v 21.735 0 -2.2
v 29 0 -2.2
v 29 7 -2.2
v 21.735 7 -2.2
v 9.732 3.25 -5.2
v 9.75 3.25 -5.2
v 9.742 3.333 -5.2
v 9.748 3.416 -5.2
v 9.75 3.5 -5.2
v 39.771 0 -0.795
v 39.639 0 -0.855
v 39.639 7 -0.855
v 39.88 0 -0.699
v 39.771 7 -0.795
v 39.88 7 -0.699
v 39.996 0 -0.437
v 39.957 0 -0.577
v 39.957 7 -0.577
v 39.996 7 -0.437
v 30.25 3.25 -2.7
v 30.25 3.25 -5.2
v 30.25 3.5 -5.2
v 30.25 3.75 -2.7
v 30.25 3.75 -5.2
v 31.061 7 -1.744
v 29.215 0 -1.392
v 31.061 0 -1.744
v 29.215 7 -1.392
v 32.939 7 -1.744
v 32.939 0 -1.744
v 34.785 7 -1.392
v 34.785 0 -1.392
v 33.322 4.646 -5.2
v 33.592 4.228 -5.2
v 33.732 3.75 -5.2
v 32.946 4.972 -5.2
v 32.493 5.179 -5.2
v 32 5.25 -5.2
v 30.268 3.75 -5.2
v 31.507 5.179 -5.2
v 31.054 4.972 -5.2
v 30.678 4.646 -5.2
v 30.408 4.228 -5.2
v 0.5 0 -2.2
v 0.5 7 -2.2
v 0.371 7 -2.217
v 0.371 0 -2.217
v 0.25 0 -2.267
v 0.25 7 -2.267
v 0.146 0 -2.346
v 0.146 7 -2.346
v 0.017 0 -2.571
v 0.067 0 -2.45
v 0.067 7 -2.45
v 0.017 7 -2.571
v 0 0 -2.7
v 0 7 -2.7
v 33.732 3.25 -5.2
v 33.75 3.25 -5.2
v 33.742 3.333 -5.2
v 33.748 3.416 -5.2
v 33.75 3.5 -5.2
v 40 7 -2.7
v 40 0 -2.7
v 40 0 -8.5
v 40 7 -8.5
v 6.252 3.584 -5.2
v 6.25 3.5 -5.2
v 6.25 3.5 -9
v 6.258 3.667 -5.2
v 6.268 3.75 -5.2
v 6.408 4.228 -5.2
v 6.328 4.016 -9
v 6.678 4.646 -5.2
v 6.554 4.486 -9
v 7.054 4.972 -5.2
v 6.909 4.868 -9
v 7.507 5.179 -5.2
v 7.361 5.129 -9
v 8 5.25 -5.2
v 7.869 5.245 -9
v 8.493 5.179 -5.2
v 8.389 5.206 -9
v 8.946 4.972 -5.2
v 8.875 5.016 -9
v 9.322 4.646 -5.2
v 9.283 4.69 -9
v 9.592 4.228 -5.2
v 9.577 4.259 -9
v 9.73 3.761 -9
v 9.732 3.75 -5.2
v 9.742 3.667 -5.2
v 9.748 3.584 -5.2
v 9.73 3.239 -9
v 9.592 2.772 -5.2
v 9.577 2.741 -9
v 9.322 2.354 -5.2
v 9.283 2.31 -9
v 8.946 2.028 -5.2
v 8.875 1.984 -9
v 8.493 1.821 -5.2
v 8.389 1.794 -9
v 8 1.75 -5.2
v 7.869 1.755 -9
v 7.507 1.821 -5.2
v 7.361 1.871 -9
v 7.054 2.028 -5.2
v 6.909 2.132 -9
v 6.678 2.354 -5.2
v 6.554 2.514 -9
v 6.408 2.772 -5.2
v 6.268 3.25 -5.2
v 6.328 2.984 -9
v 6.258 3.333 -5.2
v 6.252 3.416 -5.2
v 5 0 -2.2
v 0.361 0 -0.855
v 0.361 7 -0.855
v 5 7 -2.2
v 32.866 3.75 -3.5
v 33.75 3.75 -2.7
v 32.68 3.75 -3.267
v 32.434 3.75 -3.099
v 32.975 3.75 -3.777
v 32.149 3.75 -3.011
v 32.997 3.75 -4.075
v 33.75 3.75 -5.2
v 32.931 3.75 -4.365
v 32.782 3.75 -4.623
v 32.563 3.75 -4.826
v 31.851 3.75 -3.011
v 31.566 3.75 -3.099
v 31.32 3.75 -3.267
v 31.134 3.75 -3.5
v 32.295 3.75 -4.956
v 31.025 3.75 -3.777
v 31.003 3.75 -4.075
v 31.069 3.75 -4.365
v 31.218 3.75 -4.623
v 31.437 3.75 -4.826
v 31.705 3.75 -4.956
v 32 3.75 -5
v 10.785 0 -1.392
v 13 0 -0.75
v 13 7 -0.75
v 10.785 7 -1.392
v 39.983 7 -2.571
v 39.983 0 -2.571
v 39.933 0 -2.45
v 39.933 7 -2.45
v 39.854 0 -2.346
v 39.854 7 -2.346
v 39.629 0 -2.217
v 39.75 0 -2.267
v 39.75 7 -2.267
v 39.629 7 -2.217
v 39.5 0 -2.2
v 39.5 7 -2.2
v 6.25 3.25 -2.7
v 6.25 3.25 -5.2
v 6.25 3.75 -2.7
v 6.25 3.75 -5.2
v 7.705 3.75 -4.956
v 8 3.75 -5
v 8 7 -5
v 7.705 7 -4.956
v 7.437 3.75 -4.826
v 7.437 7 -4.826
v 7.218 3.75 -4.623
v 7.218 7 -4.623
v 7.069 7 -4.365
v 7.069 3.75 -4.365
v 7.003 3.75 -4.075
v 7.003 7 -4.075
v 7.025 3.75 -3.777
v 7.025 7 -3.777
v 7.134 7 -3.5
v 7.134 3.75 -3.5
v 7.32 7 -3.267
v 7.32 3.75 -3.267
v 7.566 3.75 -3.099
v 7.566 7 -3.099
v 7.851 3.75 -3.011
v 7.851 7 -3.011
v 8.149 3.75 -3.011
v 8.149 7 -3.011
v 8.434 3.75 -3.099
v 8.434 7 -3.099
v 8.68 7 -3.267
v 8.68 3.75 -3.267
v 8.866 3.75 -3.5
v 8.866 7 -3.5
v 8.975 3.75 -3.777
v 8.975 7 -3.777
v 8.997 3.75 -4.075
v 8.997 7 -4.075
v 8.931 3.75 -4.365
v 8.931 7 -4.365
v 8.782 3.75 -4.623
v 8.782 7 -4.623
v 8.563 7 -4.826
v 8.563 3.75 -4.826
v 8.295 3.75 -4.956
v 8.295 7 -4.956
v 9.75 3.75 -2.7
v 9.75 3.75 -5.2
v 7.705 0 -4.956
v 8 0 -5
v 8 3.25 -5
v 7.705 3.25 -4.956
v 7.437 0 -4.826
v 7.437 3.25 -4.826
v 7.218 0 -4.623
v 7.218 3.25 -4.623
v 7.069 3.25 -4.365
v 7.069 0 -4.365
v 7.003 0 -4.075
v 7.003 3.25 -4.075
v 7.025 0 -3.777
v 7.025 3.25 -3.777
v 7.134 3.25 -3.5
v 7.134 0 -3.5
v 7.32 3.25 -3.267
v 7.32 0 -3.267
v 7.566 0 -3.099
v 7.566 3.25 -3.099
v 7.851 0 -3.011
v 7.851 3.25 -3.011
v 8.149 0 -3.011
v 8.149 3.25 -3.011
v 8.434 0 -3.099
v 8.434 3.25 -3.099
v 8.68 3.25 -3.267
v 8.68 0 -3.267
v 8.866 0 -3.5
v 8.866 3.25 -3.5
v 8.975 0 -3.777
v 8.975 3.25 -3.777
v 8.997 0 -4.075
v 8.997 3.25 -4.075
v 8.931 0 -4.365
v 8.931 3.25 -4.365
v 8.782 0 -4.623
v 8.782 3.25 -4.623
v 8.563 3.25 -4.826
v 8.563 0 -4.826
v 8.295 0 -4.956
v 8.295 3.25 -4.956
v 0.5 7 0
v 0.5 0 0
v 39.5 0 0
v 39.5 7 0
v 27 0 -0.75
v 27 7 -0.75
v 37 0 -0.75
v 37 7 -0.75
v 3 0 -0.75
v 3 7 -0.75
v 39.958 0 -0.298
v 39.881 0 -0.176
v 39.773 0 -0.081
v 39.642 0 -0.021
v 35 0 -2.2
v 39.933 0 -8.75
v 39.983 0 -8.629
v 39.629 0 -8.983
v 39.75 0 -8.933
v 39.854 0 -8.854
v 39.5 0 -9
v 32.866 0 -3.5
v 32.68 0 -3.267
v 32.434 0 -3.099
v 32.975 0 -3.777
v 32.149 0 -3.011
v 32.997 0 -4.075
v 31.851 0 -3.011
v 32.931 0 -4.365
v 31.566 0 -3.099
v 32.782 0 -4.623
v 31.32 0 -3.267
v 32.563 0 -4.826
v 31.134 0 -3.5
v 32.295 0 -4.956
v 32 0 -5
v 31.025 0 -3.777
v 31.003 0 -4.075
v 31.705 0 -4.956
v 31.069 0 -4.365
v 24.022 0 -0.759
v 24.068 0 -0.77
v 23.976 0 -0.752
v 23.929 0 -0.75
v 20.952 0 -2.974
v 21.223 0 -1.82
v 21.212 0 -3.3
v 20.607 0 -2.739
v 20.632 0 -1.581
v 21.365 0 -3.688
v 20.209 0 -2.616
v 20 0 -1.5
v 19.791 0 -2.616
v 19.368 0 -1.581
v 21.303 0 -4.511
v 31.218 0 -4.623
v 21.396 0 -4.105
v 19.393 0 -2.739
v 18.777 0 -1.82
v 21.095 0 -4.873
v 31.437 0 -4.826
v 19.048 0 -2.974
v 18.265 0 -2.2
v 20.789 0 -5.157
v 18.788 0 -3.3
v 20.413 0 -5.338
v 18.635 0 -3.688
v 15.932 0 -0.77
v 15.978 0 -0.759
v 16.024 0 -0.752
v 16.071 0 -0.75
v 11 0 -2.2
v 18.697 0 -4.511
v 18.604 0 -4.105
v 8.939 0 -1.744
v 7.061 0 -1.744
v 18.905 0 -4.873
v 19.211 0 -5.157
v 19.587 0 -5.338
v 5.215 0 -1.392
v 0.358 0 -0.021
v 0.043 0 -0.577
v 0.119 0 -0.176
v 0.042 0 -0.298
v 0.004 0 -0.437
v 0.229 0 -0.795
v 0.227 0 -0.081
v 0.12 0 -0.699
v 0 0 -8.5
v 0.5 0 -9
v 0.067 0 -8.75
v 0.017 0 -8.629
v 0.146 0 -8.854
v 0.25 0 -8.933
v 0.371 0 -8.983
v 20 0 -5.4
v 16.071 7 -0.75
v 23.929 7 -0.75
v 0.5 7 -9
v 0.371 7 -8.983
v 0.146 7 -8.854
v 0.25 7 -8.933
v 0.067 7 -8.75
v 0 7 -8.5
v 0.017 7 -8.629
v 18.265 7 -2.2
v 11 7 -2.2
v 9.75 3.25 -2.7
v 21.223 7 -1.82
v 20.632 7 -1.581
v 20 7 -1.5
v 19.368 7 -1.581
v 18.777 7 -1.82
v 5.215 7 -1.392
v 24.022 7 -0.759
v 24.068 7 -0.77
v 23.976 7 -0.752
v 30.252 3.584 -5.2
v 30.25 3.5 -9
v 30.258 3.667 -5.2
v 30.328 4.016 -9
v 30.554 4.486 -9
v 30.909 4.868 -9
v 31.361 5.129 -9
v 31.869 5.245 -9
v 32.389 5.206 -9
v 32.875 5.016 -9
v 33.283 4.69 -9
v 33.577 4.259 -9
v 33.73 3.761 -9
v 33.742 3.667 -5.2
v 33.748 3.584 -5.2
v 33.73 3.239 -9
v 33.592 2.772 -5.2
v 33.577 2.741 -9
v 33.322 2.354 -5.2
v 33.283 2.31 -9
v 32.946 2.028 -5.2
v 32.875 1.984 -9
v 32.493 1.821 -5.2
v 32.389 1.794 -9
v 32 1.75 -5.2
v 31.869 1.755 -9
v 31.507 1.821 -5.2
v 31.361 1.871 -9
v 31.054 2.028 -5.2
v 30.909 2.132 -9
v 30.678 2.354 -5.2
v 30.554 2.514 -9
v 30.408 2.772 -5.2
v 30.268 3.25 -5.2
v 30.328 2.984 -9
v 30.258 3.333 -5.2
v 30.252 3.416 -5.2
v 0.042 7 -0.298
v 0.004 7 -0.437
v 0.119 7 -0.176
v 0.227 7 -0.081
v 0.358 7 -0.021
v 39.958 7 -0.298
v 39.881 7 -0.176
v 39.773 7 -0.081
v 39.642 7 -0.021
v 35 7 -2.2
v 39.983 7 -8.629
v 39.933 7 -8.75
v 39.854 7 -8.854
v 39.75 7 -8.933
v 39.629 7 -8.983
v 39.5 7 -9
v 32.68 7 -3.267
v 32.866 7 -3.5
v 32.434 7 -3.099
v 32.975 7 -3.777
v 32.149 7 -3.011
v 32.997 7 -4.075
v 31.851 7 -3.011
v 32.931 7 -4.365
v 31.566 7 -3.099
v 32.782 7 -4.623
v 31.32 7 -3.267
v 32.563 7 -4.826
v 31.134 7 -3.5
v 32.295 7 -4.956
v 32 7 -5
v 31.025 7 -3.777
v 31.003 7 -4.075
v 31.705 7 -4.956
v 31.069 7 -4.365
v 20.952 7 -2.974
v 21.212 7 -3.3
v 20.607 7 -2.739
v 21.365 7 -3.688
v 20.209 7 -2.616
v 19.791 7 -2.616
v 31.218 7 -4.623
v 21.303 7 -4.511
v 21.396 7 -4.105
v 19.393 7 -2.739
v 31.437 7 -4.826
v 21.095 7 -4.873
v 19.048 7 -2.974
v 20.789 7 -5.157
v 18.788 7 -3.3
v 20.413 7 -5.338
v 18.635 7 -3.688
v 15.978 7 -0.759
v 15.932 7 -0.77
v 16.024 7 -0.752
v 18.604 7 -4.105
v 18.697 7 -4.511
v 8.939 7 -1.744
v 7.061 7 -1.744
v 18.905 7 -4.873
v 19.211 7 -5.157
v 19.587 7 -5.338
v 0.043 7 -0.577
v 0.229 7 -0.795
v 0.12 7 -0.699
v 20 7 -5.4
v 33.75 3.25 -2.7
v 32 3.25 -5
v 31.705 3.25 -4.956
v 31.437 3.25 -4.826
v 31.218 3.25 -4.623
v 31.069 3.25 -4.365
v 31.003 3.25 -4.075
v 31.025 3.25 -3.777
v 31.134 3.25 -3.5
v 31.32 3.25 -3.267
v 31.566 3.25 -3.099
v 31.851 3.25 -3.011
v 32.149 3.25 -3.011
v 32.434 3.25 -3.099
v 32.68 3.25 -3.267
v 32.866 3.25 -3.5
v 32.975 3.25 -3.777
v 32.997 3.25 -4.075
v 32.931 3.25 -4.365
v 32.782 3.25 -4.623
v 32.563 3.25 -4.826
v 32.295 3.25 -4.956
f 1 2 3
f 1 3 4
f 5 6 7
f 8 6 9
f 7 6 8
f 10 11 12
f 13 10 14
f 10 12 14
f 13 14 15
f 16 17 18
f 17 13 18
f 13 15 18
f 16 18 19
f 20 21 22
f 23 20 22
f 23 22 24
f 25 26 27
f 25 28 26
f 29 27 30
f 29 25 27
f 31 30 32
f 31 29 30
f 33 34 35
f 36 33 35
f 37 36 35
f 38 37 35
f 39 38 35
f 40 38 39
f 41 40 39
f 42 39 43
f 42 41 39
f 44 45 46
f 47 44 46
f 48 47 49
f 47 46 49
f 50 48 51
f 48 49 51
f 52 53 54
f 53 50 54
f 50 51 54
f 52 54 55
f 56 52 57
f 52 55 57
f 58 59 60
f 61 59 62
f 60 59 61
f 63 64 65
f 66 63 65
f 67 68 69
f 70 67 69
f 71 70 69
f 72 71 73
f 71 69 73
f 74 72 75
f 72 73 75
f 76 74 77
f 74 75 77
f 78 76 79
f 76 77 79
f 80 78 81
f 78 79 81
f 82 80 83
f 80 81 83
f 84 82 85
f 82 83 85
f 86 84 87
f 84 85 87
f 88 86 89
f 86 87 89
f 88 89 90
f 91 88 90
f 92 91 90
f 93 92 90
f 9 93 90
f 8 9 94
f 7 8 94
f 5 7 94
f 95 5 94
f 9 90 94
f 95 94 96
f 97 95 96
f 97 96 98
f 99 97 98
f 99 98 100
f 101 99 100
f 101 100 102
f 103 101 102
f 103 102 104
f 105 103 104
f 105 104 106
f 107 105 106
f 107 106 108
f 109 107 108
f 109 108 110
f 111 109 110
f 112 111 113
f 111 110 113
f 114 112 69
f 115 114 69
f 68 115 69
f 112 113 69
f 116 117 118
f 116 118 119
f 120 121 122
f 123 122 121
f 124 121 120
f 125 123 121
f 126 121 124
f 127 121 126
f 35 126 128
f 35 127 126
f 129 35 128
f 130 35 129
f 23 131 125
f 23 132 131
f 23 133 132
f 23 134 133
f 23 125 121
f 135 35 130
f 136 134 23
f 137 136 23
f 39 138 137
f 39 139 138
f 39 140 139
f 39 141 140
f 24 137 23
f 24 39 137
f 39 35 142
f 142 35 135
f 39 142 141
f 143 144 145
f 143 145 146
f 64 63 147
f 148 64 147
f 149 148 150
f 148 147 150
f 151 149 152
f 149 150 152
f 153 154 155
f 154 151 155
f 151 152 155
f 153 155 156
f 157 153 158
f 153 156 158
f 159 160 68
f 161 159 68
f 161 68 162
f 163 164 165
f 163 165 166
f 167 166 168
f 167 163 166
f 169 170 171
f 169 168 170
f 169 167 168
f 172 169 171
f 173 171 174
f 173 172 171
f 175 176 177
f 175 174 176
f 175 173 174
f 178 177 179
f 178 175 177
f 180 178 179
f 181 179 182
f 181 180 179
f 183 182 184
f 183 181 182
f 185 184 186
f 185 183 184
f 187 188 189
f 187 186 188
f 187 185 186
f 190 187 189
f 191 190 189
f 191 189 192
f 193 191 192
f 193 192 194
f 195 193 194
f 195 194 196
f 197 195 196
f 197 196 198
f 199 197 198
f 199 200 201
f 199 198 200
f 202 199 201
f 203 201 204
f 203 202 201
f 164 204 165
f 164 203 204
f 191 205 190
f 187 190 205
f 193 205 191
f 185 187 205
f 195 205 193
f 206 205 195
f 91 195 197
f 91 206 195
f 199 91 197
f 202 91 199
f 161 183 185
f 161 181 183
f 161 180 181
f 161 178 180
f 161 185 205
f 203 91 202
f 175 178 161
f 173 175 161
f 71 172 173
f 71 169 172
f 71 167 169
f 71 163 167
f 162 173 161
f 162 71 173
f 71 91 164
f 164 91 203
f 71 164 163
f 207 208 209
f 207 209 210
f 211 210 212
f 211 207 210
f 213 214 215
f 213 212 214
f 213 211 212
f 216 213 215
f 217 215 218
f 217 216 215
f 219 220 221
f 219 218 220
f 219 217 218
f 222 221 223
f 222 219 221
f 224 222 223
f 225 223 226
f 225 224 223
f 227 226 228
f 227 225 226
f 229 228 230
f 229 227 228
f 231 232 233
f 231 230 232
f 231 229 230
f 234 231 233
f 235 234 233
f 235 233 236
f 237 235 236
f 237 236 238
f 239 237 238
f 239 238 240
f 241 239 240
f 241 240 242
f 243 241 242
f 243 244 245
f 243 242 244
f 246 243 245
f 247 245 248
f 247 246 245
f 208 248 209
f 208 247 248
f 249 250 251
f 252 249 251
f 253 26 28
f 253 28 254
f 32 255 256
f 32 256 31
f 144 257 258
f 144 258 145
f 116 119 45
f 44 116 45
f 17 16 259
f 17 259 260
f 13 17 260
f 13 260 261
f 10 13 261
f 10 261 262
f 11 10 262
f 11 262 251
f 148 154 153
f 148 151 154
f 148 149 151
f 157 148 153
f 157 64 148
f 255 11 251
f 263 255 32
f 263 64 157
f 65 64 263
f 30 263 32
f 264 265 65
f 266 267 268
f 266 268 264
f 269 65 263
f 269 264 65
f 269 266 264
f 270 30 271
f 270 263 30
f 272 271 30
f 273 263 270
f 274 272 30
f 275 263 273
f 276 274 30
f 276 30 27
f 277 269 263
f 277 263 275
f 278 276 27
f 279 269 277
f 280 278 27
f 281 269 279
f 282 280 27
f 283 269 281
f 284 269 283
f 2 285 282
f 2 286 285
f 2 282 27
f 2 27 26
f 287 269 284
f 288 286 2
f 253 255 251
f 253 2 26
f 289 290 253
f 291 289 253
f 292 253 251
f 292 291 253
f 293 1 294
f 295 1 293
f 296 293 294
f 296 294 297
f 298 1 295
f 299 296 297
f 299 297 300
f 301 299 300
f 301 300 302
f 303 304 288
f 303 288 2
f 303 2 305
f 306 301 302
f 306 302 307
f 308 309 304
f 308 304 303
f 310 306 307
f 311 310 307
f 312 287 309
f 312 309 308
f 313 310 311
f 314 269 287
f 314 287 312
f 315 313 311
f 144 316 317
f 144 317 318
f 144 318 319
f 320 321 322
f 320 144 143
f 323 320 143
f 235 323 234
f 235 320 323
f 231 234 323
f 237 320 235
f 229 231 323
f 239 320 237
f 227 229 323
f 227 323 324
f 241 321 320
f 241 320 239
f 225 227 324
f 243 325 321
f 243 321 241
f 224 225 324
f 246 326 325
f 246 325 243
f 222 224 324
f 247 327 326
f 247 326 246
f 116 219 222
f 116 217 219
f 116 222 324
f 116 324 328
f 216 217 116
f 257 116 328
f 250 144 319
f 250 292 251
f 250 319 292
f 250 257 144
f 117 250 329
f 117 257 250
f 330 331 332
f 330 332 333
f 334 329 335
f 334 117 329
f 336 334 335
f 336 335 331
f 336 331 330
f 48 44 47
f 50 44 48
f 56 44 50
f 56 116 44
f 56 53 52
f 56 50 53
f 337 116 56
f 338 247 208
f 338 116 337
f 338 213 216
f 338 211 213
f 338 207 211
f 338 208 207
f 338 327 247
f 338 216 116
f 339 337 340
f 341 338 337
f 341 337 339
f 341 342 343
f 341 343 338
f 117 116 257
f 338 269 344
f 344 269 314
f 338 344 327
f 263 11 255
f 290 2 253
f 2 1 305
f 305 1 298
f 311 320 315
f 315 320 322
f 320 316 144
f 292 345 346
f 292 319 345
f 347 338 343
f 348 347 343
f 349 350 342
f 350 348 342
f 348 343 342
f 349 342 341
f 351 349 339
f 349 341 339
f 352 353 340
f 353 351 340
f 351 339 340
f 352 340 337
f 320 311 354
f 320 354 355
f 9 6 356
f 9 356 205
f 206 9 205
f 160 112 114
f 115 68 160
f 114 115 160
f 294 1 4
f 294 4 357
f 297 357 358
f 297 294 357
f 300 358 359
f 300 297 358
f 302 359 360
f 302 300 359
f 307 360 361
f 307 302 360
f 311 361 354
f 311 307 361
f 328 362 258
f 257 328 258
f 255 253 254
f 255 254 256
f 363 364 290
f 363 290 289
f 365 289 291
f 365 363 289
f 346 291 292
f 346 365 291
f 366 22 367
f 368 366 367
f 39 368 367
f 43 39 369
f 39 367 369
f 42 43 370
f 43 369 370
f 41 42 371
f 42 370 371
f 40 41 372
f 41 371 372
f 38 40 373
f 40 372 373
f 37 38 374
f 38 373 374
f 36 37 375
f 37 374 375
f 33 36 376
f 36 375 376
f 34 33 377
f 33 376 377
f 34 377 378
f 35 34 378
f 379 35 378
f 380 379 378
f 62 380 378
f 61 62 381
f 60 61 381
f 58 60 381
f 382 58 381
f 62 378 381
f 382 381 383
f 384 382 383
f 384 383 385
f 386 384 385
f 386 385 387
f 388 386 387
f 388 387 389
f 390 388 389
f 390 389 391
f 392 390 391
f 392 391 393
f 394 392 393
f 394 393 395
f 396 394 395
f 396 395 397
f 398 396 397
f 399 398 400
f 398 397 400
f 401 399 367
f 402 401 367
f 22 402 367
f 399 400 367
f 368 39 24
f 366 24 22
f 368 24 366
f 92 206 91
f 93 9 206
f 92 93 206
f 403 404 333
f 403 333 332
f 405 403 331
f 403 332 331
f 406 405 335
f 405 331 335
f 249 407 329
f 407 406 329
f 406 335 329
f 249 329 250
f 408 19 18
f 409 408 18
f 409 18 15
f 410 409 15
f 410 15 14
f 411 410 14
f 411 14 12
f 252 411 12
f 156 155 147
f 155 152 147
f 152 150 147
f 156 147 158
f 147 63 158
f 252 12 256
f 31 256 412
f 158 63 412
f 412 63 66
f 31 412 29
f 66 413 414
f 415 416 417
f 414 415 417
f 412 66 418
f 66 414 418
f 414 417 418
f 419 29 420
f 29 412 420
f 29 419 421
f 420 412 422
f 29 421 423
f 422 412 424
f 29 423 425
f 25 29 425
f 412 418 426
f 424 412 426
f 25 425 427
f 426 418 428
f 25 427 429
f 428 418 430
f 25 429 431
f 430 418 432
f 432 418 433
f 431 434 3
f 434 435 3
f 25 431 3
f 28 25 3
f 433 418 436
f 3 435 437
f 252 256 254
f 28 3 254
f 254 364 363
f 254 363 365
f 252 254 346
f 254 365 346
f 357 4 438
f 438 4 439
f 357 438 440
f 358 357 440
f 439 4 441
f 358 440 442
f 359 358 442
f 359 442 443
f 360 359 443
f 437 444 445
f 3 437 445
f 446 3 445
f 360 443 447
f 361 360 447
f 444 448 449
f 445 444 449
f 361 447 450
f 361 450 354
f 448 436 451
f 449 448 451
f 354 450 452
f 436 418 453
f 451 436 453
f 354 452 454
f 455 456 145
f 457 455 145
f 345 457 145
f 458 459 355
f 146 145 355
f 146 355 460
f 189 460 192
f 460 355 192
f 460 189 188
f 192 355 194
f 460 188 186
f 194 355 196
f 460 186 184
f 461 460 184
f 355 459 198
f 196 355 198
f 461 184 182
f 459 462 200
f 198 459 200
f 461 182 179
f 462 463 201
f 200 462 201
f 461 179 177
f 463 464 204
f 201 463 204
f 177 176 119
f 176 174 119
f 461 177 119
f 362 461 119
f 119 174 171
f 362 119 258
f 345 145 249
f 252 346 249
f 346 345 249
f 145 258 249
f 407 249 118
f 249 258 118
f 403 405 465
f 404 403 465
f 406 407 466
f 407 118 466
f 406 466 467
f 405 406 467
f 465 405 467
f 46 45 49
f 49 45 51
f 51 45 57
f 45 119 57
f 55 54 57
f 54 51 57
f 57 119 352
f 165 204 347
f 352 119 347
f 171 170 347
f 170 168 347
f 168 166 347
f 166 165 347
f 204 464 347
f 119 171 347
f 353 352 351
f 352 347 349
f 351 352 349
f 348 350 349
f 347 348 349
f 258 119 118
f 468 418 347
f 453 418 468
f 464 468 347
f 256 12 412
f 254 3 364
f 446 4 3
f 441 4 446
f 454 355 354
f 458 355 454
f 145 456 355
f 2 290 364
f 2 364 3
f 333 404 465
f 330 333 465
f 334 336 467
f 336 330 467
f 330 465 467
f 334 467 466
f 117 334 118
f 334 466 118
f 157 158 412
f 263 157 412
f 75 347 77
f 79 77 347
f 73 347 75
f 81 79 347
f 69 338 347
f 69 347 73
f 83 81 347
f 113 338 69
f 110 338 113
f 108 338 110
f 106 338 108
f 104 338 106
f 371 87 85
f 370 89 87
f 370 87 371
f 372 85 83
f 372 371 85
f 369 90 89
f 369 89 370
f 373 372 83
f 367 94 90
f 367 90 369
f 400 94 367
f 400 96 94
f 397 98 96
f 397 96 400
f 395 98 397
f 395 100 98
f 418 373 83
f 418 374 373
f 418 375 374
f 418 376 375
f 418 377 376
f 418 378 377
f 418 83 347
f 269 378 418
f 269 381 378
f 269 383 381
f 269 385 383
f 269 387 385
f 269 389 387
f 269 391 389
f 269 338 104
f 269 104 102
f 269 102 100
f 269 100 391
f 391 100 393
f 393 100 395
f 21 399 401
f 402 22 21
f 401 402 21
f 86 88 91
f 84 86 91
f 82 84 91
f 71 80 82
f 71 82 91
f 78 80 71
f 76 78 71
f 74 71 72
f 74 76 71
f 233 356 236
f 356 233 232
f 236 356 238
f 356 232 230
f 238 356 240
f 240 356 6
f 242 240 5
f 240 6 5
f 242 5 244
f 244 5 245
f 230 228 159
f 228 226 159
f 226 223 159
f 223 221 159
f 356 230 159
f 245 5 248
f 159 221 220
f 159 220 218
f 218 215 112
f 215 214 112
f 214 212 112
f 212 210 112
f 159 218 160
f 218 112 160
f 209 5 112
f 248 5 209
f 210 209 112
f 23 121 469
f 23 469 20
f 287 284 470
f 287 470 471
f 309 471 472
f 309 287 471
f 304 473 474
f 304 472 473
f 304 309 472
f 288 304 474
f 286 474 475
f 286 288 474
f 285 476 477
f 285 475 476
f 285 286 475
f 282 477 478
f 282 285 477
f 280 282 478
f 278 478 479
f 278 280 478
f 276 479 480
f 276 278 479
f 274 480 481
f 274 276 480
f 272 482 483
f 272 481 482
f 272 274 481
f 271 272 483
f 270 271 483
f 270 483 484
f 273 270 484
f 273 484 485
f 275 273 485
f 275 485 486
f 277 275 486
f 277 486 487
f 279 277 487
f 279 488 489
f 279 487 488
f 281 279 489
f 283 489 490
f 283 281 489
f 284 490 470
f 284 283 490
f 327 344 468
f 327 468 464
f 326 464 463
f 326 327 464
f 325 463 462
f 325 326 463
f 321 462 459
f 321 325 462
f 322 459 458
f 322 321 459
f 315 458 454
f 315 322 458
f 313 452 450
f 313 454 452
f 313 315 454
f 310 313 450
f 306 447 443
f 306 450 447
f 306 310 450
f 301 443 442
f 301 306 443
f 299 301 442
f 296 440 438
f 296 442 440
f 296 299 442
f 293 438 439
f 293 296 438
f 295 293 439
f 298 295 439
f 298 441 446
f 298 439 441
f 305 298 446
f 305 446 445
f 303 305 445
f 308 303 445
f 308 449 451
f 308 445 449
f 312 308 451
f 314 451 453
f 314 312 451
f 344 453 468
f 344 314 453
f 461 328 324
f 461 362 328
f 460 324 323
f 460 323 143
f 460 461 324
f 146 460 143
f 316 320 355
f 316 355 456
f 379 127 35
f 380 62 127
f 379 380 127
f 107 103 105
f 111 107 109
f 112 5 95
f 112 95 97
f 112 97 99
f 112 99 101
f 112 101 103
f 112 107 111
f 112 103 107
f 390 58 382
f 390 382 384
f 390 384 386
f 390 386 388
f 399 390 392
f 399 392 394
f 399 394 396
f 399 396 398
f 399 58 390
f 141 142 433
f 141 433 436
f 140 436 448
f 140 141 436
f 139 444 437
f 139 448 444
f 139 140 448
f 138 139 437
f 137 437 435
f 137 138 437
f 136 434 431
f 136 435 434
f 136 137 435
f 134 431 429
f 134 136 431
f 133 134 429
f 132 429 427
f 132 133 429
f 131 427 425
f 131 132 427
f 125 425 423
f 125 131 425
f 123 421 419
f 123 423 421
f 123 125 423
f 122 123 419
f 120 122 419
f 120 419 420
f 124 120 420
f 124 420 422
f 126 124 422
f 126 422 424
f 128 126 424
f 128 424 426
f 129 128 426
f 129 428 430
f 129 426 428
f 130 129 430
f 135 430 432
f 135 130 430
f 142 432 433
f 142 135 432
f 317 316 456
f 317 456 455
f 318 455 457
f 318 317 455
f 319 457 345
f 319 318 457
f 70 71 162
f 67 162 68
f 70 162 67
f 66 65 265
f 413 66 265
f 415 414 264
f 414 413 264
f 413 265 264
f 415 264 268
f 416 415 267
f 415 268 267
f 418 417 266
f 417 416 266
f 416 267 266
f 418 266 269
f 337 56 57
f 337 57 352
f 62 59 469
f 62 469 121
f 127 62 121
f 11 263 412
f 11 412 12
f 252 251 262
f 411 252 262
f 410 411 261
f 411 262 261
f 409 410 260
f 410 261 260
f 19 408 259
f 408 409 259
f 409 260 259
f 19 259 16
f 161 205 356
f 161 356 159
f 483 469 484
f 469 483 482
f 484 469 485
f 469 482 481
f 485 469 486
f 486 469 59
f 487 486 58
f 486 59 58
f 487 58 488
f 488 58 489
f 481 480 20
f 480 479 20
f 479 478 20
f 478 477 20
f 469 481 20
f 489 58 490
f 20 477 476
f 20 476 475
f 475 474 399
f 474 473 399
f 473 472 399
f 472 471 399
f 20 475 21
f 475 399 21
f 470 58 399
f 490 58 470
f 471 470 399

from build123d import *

# Parameters (mm, degrees)
SKETCH1_W               = 40
SKETCH1_H               = 9
BOSS_EXTRUDE1_DEPTH     = 7
CUT_EXTRUDE1_DEPTH      = 5
CUT_EXTRUDE1_DEPTH_BACK = 10
SKETCH2_R               = 1
SKETCH2_R_2             = 1.4
FILLET1_R               = 10
FILLET2_R               = 0.5
SKETCH3_R               = 1.75
CUT_EXTRUDE6_DEPTH      = 3.8
SKETCH4_W               = 3.5
SKETCH4_H               = 0.5
CUT_EXTRUDE7_DEPTH      = 2.5


with BuildPart() as part:
    # Sketch1 → Boss-Extrude1 (new body)
    with BuildSketch(Plane(origin=(0, 0, 0), x_dir=(1, 0, 0), z_dir=(0, 1, 0))):
        with Locations((20, 4.5)):
            Rectangle(SKETCH1_W, SKETCH1_H)
    extrude(amount=BOSS_EXTRUDE1_DEPTH)

    # Sketch2 → Cut-Extrude1 (cut, two sides: drawn at the far end of the back side and taken through both)
    with BuildSketch(Plane(origin=(0, 7, 0), x_dir=(1, 0, 0), z_dir=(0, 1, 0)).offset(-CUT_EXTRUDE1_DEPTH_BACK)):
        with Locations(Location((8, 4, 0), (0, 0, 90))):
            Circle(SKETCH2_R)
        with Locations(Location((32, 4, 0), (0, 0, 90))):
            Circle(SKETCH2_R)
        with Locations(Location((20, 4, 0), (0, 0, 90))):
            Circle(SKETCH2_R_2)
        with BuildLine():
            ThreePointArc((21.734935157, 2.2), (20, 1.5), (18.265064843, 2.2))
            Line((18.265064843, 2.2), (11, 2.2))
            Line((11, 2.2), (16, 0.75))
            Line((16, 0.75), (24, 0.75))
            Line((24, 0.75), (29, 2.2))
            Line((29, 2.2), (21.734935157, 2.2))
        make_face()
        Polygon((13, 0.75), (8, 2.2), (3, 0.75), align=None)
        Polygon((37, 0.75), (32, 2.2), (27, 0.75), align=None)
        Polygon((0, 0.75), (5, 2.2), (0, 2.2), align=None)
        Polygon((40, 2.2), (35, 2.2), (40, 0.75), align=None)
    extrude(amount=CUT_EXTRUDE1_DEPTH + CUT_EXTRUDE1_DEPTH_BACK, mode=Mode.SUBTRACT)

    # Fillet1
    fillet1_edges = [part.edges().sort_by_distance(p)[0] for p in [
        (32, 3.5, -2.2),
        (8, 3.5, -2.2),
    ]]
    fillet(fillet1_edges, radius=FILLET1_R)

    # Fillet2
    # the kernel refuses this fillet: 0.5 mm, written as the material it adds along each edge
    with BuildSketch(Plane(origin=(24, 7, -0.75), x_dir=(0.9604291387787307, 0, -0.27852445024583705), z_dir=(0, -1, 0))) as fillet2_piece_1:
        with BuildLine():
            CenterArc((FILLET2_R * 0.142073204655, -FILLET2_R), FILLET2_R, 90, 16.172159016)
            Line((-FILLET2_R * 0.136451245591, -FILLET2_R * 0.0395708612213), (0, 0))
            Line((0, 0), (FILLET2_R * 0.142073204655, 0))
        make_face()
    extrude(amount=7)
    with BuildSketch(Plane(origin=(16, 0, -0.75), x_dir=(1, 0, 0), z_dir=(0, 1, 0))) as fillet2_piece_2:
        with BuildLine():
            CenterArc((FILLET2_R * 0.142073204655, FILLET2_R), FILLET2_R, 253.827840984, 16.172159016)
            Line((-FILLET2_R * 0.136451245591, FILLET2_R * 0.0395708612213), (0, 0))
            Line((0, 0), (FILLET2_R * 0.142073204655, 0))
        make_face()
    extrude(amount=7)
    # the kernel refuses this fillet: 0.5 mm, written as the material it takes off along each edge
    with BuildSketch(Plane(origin=(0, 7.939001537, -0.75), x_dir=(0.960429138778732, 0, -0.2785244502458324), z_dir=(0, -1, 0)), Plane(origin=(40, 7.939001537, -0.75), x_dir=(0, 0, 1), z_dir=(0, -1, 0))) as fillet2_2_piece_1:
        with BuildLine():
            CenterArc((FILLET2_R * 0.75120122935, FILLET2_R), FILLET2_R, 196.172159016, 73.827840984)
            Line((-FILLET2_R * 0.209227909429, FILLET2_R * 0.721475549754), (0, 0))
            Line((0, 0), (FILLET2_R * 0.75120122935, 0))
        make_face()
    extrude(amount=8.878003073, mode=Mode.SUBTRACT)
    with BuildSketch(Plane(origin=(0, 8.25, -2.2), x_dir=(0, 0, -1), z_dir=(0, -1, 0)), Plane(origin=(40, 8.25, -2.2), x_dir=(-1, 0, 0), z_dir=(0, -1, 0)), Plane(origin=(0, -1.25, 0), x_dir=(1, 0, 0), z_dir=(0, 1, 0))) as fillet2_2_piece_2:
        with BuildLine():
            CenterArc((FILLET2_R, FILLET2_R), FILLET2_R, 180, 90)
            Line((0, FILLET2_R), (0, 0))
            Line((0, 0), (FILLET2_R, 0))
        make_face()
    extrude(amount=9.5, mode=Mode.SUBTRACT)
    with BuildSketch(Plane(origin=(0, -1.25, -9), x_dir=(1, 0, 0), z_dir=(0, 1, 0)), Plane(origin=(40, -1.25, -9), x_dir=(0, 0, 1), z_dir=(0, 1, 0)), Plane(origin=(40, -1.25, 0), x_dir=(-1, 0, 0), z_dir=(0, 1, 0))) as fillet2_2_piece_3:
        with BuildLine():
            CenterArc((FILLET2_R, -FILLET2_R), FILLET2_R, 90, 90)
            Line((0, -FILLET2_R), (0, 0))
            Line((0, 0), (FILLET2_R, 0))
        make_face()
    extrude(amount=9.5, mode=Mode.SUBTRACT)

    # Sketch3 → Cut-Extrude6 (cut)
    with BuildSketch(Plane(origin=(0, 0, -9), x_dir=(-1, 0, 0), z_dir=(0, 0, -1))):
        with Locations((-32, 3.5)):
            Circle(SKETCH3_R)
        with Locations((-8, 3.5)):
            Circle(SKETCH3_R)
    extrude(amount=-CUT_EXTRUDE6_DEPTH, mode=Mode.SUBTRACT)

    # Sketch4 → Cut-Extrude7 (cut)
    with BuildSketch(Plane(origin=(0, 0, -5.2), x_dir=(-1, 0, 0), z_dir=(0, 0, -1))):
        with Locations((-32, 3.5)):
            Rectangle(SKETCH4_W, SKETCH4_H)
        with Locations((-8, 3.5)):
            Rectangle(SKETCH4_W, SKETCH4_H)
    extrude(amount=-CUT_EXTRUDE7_DEPTH, mode=Mode.SUBTRACT)


solid = part.part
